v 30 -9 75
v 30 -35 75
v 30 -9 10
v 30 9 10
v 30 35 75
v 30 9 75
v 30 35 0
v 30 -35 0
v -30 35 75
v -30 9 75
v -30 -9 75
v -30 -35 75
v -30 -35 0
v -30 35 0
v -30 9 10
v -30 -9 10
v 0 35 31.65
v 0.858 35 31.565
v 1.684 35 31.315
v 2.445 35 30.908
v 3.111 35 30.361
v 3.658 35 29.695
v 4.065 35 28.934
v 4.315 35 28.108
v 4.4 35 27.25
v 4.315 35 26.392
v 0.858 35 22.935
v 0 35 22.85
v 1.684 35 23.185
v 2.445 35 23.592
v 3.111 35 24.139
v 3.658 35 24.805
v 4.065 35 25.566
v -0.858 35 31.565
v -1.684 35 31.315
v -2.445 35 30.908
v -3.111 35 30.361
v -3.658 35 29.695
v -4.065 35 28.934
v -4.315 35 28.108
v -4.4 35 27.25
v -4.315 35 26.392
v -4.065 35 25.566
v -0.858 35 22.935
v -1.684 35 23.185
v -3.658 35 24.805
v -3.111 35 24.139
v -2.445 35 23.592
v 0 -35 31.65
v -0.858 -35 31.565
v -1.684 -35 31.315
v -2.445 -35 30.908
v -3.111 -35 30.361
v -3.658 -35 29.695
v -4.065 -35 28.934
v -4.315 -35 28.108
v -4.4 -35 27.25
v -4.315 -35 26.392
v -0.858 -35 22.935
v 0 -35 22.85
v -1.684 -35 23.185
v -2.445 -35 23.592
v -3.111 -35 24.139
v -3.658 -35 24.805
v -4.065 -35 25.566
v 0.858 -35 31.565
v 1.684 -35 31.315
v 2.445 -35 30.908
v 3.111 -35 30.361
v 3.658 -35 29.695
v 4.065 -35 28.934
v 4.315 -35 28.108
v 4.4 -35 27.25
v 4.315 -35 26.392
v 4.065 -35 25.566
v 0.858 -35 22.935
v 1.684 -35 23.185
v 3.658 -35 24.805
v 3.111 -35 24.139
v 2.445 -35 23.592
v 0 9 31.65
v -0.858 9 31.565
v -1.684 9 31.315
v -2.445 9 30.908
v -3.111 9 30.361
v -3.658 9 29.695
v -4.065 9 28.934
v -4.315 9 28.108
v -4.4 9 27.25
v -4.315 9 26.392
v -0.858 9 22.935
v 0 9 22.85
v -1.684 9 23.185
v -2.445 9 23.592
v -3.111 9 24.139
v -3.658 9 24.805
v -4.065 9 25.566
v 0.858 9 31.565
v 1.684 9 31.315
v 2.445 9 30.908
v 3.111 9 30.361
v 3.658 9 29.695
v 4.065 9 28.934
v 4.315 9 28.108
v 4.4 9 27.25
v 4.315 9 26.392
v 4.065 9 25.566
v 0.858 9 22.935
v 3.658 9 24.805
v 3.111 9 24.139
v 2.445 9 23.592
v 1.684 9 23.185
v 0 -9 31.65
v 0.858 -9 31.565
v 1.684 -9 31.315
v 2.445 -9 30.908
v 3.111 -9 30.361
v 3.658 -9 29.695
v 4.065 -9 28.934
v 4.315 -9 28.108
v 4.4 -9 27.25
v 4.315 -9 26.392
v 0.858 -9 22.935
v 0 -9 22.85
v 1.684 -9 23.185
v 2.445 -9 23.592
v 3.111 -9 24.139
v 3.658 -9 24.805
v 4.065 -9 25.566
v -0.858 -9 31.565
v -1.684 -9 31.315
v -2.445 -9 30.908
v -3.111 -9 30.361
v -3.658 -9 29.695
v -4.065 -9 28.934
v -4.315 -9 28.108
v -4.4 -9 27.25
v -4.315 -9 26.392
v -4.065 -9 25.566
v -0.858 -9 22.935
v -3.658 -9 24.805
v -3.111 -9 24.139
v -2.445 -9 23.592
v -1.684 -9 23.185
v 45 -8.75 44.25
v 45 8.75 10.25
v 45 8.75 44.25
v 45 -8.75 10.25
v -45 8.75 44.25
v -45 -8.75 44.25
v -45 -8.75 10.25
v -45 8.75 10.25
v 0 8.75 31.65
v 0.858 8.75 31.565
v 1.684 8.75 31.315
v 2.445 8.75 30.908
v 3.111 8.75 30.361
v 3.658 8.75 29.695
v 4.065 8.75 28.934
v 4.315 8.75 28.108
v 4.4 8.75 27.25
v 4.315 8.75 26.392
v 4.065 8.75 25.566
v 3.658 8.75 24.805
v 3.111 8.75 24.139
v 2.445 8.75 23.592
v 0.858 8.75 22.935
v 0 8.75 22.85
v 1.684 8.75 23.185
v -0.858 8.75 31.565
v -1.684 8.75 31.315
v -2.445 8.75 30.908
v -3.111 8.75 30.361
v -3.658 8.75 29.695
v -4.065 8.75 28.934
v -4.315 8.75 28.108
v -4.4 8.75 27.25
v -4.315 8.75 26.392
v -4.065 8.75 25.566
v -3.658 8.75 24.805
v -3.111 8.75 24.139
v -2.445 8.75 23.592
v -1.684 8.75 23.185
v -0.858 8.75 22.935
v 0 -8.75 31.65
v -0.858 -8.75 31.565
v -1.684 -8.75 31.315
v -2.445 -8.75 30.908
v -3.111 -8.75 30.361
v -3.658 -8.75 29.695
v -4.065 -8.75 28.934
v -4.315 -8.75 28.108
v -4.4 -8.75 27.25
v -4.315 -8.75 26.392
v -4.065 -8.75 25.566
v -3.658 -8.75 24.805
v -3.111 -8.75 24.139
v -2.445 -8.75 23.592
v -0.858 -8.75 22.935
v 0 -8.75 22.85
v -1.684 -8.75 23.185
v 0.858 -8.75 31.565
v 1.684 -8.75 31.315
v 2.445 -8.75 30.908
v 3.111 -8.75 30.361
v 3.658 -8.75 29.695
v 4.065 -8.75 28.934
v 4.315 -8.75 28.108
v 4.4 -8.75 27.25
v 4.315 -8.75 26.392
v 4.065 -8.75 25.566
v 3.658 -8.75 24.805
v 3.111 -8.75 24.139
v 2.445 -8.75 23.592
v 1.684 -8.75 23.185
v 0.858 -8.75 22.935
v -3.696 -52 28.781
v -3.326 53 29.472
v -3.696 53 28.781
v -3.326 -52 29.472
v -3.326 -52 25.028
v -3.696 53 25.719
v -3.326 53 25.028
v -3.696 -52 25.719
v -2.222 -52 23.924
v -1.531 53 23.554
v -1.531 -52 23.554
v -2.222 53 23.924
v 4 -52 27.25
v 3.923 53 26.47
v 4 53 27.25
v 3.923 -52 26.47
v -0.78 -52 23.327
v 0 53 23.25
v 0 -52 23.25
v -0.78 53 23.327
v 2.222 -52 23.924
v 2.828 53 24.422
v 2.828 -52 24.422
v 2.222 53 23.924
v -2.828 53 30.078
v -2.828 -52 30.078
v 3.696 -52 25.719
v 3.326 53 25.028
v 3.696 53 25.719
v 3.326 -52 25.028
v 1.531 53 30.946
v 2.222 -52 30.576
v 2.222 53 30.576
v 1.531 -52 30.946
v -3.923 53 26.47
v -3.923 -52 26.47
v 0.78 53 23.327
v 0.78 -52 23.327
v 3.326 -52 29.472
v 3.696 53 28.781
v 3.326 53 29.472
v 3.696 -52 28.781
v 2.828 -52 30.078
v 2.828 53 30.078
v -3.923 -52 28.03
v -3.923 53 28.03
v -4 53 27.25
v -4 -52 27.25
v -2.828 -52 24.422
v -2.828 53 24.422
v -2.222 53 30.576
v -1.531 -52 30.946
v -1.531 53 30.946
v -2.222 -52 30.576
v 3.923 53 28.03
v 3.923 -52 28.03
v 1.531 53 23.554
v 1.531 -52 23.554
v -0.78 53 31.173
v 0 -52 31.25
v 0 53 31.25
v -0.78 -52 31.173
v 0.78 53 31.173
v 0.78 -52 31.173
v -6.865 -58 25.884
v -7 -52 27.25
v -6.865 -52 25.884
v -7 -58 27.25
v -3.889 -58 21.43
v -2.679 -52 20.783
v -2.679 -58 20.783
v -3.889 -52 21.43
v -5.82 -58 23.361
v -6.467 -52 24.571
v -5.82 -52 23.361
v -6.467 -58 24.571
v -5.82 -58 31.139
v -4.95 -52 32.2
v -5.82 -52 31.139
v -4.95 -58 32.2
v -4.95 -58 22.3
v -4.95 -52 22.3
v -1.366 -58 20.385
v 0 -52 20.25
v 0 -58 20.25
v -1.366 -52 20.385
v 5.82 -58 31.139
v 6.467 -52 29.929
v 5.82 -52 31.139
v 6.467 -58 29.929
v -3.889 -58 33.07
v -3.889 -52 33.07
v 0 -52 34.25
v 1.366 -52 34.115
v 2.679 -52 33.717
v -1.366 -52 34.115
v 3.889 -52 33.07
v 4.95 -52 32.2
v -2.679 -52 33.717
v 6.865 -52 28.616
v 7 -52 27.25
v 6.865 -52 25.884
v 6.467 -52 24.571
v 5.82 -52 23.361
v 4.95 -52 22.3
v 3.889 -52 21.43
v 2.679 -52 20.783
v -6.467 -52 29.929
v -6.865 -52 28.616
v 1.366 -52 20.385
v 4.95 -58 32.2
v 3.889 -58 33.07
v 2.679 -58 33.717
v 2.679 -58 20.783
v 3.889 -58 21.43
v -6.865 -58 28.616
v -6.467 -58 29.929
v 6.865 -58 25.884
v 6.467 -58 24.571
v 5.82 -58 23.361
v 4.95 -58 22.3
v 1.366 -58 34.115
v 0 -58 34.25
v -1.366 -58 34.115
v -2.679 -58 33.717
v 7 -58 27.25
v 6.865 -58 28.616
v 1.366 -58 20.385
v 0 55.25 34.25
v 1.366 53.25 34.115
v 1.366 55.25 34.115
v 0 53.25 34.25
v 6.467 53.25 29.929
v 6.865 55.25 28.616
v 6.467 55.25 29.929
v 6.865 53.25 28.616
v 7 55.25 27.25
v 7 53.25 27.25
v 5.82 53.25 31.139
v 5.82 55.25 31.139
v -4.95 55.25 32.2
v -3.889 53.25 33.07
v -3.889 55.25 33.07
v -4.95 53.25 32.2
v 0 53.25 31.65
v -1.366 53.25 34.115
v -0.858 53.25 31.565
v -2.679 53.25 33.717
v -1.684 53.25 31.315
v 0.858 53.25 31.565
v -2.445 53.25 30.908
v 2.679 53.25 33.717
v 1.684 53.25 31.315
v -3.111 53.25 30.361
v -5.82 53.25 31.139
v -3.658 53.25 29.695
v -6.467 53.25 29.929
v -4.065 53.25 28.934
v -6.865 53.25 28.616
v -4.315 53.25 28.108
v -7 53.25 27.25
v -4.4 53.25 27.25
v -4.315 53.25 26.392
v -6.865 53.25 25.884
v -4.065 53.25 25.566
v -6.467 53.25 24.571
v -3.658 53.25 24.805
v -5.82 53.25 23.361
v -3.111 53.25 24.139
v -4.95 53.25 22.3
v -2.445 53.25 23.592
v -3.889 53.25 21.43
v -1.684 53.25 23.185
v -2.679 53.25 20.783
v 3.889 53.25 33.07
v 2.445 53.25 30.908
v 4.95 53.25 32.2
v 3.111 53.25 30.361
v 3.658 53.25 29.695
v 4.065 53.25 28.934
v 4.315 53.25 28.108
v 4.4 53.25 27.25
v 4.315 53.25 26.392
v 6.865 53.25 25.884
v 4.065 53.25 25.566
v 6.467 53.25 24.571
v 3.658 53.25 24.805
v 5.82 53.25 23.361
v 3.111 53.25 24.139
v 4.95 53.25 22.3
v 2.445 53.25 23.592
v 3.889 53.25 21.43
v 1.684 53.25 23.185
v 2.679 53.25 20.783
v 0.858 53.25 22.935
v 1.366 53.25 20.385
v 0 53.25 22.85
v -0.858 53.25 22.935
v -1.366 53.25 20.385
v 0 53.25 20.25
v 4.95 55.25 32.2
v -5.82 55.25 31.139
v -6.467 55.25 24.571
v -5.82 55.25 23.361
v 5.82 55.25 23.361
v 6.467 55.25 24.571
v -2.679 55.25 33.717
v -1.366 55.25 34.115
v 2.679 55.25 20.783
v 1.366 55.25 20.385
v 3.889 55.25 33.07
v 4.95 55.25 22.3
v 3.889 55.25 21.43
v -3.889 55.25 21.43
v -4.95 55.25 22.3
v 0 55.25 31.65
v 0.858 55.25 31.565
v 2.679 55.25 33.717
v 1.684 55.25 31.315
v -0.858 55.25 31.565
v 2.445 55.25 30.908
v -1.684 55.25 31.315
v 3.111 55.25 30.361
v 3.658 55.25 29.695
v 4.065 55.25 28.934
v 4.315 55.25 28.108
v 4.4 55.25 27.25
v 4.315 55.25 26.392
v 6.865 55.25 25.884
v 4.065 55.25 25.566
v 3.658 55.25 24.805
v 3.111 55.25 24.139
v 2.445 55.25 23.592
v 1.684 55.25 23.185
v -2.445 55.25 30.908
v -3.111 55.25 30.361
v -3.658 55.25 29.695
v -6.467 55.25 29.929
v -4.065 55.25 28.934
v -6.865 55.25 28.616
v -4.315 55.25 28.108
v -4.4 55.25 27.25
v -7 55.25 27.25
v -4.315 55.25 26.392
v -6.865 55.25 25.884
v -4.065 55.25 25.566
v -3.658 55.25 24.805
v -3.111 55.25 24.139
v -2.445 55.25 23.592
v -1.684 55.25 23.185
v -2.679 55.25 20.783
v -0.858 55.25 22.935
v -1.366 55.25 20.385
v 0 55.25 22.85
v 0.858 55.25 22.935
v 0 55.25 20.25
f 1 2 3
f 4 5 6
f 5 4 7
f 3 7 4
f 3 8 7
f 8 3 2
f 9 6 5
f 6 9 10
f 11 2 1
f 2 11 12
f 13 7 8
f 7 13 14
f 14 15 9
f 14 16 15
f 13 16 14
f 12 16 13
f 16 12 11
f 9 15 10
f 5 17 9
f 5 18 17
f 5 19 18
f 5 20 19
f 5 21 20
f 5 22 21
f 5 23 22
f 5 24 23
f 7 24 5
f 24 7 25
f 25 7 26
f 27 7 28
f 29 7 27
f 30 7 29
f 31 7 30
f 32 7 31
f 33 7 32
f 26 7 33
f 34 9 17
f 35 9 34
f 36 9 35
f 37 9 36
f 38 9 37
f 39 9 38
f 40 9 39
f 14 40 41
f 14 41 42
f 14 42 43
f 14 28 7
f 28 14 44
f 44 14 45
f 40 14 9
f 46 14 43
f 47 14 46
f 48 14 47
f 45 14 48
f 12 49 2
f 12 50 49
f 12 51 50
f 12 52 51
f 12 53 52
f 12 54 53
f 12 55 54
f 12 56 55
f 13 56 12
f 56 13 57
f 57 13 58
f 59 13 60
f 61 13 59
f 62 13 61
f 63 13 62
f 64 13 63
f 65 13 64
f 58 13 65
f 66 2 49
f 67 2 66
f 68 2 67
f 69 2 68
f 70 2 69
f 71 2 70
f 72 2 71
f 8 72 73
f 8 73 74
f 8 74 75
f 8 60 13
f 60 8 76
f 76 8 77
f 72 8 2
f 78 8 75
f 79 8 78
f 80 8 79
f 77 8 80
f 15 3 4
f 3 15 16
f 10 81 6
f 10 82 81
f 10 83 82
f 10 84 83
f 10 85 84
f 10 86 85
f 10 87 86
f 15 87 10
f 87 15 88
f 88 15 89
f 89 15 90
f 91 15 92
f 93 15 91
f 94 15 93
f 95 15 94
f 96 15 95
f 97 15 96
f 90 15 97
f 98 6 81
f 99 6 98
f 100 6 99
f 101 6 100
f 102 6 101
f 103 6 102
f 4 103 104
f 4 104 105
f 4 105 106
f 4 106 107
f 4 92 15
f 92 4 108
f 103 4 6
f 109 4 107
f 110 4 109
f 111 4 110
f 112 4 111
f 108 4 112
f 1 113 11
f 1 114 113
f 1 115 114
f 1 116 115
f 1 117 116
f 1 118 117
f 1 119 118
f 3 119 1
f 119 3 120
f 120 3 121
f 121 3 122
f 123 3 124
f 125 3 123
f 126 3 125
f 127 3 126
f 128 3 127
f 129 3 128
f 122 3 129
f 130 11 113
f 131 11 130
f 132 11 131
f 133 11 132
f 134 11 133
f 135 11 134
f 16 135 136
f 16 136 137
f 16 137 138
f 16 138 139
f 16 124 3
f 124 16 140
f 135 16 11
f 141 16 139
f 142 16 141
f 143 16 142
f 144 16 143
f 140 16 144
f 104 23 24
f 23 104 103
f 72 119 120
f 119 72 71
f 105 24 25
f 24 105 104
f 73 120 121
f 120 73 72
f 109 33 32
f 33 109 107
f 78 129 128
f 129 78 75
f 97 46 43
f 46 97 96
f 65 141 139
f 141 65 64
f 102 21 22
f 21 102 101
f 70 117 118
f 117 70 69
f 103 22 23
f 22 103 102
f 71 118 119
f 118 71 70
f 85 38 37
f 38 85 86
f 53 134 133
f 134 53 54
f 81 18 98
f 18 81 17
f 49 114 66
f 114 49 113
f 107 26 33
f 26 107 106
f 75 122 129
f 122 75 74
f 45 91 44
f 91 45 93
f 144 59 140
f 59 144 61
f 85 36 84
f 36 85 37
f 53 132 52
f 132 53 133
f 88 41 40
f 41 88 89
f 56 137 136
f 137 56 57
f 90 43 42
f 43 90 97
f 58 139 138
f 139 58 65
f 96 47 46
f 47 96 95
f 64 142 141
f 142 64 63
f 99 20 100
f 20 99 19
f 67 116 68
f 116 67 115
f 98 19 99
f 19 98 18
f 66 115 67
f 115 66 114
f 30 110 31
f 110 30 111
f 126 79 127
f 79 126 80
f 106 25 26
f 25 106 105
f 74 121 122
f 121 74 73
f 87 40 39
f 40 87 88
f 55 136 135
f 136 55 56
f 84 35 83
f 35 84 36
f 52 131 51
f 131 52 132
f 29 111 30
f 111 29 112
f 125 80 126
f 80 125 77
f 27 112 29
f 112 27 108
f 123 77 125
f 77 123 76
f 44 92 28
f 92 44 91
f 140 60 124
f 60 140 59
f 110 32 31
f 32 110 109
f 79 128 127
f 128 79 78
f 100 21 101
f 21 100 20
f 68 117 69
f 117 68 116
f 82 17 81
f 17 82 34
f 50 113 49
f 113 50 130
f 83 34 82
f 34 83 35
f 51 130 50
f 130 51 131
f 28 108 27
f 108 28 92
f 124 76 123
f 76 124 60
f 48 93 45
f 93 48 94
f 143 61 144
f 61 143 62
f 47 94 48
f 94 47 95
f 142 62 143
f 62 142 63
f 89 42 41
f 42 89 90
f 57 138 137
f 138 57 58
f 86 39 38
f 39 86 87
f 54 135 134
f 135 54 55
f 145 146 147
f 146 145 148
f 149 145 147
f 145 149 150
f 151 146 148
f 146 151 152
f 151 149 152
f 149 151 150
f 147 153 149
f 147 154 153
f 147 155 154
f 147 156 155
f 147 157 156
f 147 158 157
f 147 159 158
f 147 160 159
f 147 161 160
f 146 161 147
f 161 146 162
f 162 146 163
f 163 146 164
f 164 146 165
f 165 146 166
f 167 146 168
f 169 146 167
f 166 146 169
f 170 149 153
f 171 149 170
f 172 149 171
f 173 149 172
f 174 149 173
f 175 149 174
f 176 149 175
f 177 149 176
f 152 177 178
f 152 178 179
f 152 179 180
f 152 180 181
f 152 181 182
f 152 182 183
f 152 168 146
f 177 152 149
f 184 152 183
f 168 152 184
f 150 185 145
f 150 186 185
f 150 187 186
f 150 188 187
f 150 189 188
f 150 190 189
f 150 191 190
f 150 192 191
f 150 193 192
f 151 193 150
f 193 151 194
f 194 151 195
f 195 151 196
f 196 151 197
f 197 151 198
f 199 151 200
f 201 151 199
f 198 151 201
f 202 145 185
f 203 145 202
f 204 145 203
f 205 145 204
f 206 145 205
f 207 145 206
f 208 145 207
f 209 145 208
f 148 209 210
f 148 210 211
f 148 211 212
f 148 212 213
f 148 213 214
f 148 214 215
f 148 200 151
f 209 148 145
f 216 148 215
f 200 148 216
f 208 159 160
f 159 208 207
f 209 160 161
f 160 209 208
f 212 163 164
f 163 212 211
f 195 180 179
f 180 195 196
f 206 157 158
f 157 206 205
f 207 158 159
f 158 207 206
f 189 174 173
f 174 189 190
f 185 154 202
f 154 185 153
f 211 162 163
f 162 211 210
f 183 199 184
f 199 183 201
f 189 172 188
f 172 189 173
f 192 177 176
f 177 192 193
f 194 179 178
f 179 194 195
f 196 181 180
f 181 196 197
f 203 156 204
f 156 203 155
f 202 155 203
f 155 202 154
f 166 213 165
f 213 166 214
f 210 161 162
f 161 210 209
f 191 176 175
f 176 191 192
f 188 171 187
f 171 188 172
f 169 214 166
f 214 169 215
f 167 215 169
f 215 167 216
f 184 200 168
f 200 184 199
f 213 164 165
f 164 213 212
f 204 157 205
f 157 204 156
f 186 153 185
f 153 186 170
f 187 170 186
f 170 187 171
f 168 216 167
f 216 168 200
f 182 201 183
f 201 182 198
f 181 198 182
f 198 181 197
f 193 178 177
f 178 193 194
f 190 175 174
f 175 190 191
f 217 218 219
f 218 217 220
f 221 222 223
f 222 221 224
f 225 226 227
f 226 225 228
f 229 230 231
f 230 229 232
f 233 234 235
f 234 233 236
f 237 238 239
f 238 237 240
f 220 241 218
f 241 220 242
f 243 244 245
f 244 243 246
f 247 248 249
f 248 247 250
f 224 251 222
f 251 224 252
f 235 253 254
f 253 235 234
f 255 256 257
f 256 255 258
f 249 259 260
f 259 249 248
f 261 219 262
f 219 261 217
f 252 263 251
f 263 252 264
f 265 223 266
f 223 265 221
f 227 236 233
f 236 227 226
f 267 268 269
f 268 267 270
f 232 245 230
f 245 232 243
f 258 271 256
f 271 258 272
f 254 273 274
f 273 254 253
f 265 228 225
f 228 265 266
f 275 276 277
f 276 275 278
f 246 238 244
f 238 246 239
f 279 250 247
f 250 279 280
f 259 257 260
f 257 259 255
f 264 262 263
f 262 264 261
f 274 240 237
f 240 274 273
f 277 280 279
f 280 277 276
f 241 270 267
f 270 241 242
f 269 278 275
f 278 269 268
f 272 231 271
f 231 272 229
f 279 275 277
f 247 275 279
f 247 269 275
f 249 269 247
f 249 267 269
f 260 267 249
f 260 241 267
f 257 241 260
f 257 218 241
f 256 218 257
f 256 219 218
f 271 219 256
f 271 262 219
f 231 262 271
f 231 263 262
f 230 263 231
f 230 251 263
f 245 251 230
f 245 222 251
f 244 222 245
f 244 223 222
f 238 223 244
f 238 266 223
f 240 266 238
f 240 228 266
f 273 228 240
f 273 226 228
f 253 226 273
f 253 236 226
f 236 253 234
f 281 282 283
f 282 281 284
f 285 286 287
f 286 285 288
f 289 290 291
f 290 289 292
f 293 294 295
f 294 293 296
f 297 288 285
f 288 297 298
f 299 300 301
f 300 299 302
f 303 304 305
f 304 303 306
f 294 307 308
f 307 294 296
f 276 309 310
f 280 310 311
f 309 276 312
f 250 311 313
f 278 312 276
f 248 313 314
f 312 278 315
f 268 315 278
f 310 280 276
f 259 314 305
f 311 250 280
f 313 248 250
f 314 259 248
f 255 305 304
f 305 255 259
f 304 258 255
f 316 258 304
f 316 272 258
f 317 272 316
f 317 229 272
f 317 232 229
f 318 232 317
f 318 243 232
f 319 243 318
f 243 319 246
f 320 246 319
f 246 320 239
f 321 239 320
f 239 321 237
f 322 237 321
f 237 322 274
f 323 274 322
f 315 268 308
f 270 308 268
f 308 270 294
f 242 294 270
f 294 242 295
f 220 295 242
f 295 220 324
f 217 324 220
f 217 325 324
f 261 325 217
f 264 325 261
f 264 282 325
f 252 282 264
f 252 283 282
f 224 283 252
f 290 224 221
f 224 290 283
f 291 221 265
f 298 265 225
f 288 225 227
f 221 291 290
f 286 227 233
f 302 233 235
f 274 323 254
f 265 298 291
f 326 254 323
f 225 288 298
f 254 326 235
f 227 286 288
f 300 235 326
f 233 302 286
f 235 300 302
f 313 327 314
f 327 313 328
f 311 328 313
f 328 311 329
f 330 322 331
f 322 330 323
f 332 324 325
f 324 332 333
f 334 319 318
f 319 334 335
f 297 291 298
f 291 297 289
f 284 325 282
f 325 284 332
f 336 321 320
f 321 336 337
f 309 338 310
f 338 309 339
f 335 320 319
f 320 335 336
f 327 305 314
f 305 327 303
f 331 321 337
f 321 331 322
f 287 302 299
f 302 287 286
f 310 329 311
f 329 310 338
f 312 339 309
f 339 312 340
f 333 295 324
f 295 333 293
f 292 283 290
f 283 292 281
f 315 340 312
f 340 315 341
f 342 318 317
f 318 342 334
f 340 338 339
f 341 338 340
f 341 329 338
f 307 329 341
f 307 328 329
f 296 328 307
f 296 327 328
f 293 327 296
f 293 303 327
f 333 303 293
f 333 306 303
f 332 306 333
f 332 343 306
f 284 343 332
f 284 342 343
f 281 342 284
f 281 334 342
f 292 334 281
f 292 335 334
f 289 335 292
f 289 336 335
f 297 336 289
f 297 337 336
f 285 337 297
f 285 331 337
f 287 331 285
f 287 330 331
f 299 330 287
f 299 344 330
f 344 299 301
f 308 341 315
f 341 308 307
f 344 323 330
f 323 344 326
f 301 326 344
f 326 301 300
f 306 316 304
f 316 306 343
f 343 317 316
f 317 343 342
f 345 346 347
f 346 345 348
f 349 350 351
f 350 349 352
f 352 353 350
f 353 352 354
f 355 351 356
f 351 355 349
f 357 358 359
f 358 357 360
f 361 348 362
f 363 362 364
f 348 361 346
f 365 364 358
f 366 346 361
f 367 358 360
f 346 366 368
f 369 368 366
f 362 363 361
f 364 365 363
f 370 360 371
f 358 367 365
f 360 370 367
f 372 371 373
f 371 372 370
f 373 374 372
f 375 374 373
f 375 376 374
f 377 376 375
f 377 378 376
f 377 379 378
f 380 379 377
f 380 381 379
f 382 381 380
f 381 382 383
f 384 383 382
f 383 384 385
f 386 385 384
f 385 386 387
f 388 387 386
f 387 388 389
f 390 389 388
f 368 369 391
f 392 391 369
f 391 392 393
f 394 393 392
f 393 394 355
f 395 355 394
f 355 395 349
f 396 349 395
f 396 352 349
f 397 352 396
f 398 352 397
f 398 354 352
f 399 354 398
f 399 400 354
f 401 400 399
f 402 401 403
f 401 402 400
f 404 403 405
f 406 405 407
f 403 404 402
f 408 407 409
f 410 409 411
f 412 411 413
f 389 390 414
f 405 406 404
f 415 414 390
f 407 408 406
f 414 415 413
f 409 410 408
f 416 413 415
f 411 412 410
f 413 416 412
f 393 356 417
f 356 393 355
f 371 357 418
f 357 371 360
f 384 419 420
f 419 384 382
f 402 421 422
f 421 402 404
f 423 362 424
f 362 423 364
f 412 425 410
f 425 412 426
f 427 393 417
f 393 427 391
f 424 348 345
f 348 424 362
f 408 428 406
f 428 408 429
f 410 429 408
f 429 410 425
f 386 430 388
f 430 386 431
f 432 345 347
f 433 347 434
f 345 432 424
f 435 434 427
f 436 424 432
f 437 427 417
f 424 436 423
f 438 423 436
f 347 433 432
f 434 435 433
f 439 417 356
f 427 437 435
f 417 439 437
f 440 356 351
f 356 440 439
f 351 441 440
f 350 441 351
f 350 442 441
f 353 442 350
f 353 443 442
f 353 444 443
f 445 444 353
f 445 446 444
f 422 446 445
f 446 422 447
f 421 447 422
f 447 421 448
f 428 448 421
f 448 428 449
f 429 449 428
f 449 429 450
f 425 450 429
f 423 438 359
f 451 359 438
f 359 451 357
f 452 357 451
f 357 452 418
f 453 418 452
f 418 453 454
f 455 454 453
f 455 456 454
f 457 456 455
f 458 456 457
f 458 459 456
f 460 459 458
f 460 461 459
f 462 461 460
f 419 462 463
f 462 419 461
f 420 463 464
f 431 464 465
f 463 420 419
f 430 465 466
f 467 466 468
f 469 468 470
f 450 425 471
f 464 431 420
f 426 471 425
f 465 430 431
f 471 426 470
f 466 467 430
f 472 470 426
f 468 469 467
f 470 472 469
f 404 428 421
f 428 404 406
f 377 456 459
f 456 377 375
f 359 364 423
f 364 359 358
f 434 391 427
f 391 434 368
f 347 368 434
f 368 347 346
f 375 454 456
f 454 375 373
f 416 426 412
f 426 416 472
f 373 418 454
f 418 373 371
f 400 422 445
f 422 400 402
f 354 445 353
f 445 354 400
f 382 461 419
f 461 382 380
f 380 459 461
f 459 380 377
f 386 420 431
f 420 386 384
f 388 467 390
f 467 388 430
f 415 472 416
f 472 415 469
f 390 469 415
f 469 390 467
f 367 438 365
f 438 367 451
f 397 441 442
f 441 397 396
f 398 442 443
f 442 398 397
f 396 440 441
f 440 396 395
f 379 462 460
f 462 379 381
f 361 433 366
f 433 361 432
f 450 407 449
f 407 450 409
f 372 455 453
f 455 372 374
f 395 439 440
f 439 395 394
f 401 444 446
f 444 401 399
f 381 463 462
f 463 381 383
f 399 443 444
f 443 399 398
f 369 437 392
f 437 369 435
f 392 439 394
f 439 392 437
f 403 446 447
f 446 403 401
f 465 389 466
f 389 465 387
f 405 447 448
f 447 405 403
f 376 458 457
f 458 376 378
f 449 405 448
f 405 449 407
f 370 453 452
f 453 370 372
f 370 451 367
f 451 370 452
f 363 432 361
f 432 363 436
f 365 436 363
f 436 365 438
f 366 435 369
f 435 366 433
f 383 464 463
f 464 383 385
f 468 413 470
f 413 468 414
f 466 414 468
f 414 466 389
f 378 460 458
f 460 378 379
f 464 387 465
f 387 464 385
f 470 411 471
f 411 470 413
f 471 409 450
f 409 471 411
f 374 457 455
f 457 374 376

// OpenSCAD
$fn = 32;

// ------------------------------------------------------------------------
// Clevis joint: 60 mm clevis, pin d8
// Every part is its own module, assembly() places them once.
// ------------------------------------------------------------------------

// --- part 1 ---
module clevis() {
  difference() {
    translate([-30, -35, 0]) cube([60, 70, 75]);
    translate([-31, -9, 10]) cube([62, 18, 66]);
    translate([0, 0, 27.25]) rotate([90, 0, 0]) cylinder(h = 72, d = 8.8, center = true);
  }
}

// --- part 2 ---
module eye() {
  difference() {
    translate([-45, -8.75, 0]) cube([90, 17.5, 34]);
    translate([0, 0, 17]) rotate([90, 0, 0]) cylinder(h = 19.5, d = 8.8, center = true);
  }
}

// --- part 3 ---
module pin() {
  rotate([0, 90, 0]) cylinder(h = 106, d = 8, center = true);
  translate([-58, 0, 0]) rotate([0, 90, 0]) cylinder(h = 6, d = 14);
}

// --- part 4 ---
module retainer() {
  difference() {
      translate([0, 0, 0]) cylinder(h = 2, d = 14);
      translate([0, 0, -1]) cylinder(h = 4, d = 8.8);
    }
}

// --- assembly ---
module assembly() {
  translate([0, 0, 0]) rotate([0, 0, 0]) clevis();
  translate([0, 0, 10.25]) rotate([0, 0, 0]) eye();
  translate([0, 0, 27.25]) rotate([0, 0, 90]) pin();
  translate([0, 55.25, 27.25]) rotate([90, 0, 0]) retainer();
}

assembly();
